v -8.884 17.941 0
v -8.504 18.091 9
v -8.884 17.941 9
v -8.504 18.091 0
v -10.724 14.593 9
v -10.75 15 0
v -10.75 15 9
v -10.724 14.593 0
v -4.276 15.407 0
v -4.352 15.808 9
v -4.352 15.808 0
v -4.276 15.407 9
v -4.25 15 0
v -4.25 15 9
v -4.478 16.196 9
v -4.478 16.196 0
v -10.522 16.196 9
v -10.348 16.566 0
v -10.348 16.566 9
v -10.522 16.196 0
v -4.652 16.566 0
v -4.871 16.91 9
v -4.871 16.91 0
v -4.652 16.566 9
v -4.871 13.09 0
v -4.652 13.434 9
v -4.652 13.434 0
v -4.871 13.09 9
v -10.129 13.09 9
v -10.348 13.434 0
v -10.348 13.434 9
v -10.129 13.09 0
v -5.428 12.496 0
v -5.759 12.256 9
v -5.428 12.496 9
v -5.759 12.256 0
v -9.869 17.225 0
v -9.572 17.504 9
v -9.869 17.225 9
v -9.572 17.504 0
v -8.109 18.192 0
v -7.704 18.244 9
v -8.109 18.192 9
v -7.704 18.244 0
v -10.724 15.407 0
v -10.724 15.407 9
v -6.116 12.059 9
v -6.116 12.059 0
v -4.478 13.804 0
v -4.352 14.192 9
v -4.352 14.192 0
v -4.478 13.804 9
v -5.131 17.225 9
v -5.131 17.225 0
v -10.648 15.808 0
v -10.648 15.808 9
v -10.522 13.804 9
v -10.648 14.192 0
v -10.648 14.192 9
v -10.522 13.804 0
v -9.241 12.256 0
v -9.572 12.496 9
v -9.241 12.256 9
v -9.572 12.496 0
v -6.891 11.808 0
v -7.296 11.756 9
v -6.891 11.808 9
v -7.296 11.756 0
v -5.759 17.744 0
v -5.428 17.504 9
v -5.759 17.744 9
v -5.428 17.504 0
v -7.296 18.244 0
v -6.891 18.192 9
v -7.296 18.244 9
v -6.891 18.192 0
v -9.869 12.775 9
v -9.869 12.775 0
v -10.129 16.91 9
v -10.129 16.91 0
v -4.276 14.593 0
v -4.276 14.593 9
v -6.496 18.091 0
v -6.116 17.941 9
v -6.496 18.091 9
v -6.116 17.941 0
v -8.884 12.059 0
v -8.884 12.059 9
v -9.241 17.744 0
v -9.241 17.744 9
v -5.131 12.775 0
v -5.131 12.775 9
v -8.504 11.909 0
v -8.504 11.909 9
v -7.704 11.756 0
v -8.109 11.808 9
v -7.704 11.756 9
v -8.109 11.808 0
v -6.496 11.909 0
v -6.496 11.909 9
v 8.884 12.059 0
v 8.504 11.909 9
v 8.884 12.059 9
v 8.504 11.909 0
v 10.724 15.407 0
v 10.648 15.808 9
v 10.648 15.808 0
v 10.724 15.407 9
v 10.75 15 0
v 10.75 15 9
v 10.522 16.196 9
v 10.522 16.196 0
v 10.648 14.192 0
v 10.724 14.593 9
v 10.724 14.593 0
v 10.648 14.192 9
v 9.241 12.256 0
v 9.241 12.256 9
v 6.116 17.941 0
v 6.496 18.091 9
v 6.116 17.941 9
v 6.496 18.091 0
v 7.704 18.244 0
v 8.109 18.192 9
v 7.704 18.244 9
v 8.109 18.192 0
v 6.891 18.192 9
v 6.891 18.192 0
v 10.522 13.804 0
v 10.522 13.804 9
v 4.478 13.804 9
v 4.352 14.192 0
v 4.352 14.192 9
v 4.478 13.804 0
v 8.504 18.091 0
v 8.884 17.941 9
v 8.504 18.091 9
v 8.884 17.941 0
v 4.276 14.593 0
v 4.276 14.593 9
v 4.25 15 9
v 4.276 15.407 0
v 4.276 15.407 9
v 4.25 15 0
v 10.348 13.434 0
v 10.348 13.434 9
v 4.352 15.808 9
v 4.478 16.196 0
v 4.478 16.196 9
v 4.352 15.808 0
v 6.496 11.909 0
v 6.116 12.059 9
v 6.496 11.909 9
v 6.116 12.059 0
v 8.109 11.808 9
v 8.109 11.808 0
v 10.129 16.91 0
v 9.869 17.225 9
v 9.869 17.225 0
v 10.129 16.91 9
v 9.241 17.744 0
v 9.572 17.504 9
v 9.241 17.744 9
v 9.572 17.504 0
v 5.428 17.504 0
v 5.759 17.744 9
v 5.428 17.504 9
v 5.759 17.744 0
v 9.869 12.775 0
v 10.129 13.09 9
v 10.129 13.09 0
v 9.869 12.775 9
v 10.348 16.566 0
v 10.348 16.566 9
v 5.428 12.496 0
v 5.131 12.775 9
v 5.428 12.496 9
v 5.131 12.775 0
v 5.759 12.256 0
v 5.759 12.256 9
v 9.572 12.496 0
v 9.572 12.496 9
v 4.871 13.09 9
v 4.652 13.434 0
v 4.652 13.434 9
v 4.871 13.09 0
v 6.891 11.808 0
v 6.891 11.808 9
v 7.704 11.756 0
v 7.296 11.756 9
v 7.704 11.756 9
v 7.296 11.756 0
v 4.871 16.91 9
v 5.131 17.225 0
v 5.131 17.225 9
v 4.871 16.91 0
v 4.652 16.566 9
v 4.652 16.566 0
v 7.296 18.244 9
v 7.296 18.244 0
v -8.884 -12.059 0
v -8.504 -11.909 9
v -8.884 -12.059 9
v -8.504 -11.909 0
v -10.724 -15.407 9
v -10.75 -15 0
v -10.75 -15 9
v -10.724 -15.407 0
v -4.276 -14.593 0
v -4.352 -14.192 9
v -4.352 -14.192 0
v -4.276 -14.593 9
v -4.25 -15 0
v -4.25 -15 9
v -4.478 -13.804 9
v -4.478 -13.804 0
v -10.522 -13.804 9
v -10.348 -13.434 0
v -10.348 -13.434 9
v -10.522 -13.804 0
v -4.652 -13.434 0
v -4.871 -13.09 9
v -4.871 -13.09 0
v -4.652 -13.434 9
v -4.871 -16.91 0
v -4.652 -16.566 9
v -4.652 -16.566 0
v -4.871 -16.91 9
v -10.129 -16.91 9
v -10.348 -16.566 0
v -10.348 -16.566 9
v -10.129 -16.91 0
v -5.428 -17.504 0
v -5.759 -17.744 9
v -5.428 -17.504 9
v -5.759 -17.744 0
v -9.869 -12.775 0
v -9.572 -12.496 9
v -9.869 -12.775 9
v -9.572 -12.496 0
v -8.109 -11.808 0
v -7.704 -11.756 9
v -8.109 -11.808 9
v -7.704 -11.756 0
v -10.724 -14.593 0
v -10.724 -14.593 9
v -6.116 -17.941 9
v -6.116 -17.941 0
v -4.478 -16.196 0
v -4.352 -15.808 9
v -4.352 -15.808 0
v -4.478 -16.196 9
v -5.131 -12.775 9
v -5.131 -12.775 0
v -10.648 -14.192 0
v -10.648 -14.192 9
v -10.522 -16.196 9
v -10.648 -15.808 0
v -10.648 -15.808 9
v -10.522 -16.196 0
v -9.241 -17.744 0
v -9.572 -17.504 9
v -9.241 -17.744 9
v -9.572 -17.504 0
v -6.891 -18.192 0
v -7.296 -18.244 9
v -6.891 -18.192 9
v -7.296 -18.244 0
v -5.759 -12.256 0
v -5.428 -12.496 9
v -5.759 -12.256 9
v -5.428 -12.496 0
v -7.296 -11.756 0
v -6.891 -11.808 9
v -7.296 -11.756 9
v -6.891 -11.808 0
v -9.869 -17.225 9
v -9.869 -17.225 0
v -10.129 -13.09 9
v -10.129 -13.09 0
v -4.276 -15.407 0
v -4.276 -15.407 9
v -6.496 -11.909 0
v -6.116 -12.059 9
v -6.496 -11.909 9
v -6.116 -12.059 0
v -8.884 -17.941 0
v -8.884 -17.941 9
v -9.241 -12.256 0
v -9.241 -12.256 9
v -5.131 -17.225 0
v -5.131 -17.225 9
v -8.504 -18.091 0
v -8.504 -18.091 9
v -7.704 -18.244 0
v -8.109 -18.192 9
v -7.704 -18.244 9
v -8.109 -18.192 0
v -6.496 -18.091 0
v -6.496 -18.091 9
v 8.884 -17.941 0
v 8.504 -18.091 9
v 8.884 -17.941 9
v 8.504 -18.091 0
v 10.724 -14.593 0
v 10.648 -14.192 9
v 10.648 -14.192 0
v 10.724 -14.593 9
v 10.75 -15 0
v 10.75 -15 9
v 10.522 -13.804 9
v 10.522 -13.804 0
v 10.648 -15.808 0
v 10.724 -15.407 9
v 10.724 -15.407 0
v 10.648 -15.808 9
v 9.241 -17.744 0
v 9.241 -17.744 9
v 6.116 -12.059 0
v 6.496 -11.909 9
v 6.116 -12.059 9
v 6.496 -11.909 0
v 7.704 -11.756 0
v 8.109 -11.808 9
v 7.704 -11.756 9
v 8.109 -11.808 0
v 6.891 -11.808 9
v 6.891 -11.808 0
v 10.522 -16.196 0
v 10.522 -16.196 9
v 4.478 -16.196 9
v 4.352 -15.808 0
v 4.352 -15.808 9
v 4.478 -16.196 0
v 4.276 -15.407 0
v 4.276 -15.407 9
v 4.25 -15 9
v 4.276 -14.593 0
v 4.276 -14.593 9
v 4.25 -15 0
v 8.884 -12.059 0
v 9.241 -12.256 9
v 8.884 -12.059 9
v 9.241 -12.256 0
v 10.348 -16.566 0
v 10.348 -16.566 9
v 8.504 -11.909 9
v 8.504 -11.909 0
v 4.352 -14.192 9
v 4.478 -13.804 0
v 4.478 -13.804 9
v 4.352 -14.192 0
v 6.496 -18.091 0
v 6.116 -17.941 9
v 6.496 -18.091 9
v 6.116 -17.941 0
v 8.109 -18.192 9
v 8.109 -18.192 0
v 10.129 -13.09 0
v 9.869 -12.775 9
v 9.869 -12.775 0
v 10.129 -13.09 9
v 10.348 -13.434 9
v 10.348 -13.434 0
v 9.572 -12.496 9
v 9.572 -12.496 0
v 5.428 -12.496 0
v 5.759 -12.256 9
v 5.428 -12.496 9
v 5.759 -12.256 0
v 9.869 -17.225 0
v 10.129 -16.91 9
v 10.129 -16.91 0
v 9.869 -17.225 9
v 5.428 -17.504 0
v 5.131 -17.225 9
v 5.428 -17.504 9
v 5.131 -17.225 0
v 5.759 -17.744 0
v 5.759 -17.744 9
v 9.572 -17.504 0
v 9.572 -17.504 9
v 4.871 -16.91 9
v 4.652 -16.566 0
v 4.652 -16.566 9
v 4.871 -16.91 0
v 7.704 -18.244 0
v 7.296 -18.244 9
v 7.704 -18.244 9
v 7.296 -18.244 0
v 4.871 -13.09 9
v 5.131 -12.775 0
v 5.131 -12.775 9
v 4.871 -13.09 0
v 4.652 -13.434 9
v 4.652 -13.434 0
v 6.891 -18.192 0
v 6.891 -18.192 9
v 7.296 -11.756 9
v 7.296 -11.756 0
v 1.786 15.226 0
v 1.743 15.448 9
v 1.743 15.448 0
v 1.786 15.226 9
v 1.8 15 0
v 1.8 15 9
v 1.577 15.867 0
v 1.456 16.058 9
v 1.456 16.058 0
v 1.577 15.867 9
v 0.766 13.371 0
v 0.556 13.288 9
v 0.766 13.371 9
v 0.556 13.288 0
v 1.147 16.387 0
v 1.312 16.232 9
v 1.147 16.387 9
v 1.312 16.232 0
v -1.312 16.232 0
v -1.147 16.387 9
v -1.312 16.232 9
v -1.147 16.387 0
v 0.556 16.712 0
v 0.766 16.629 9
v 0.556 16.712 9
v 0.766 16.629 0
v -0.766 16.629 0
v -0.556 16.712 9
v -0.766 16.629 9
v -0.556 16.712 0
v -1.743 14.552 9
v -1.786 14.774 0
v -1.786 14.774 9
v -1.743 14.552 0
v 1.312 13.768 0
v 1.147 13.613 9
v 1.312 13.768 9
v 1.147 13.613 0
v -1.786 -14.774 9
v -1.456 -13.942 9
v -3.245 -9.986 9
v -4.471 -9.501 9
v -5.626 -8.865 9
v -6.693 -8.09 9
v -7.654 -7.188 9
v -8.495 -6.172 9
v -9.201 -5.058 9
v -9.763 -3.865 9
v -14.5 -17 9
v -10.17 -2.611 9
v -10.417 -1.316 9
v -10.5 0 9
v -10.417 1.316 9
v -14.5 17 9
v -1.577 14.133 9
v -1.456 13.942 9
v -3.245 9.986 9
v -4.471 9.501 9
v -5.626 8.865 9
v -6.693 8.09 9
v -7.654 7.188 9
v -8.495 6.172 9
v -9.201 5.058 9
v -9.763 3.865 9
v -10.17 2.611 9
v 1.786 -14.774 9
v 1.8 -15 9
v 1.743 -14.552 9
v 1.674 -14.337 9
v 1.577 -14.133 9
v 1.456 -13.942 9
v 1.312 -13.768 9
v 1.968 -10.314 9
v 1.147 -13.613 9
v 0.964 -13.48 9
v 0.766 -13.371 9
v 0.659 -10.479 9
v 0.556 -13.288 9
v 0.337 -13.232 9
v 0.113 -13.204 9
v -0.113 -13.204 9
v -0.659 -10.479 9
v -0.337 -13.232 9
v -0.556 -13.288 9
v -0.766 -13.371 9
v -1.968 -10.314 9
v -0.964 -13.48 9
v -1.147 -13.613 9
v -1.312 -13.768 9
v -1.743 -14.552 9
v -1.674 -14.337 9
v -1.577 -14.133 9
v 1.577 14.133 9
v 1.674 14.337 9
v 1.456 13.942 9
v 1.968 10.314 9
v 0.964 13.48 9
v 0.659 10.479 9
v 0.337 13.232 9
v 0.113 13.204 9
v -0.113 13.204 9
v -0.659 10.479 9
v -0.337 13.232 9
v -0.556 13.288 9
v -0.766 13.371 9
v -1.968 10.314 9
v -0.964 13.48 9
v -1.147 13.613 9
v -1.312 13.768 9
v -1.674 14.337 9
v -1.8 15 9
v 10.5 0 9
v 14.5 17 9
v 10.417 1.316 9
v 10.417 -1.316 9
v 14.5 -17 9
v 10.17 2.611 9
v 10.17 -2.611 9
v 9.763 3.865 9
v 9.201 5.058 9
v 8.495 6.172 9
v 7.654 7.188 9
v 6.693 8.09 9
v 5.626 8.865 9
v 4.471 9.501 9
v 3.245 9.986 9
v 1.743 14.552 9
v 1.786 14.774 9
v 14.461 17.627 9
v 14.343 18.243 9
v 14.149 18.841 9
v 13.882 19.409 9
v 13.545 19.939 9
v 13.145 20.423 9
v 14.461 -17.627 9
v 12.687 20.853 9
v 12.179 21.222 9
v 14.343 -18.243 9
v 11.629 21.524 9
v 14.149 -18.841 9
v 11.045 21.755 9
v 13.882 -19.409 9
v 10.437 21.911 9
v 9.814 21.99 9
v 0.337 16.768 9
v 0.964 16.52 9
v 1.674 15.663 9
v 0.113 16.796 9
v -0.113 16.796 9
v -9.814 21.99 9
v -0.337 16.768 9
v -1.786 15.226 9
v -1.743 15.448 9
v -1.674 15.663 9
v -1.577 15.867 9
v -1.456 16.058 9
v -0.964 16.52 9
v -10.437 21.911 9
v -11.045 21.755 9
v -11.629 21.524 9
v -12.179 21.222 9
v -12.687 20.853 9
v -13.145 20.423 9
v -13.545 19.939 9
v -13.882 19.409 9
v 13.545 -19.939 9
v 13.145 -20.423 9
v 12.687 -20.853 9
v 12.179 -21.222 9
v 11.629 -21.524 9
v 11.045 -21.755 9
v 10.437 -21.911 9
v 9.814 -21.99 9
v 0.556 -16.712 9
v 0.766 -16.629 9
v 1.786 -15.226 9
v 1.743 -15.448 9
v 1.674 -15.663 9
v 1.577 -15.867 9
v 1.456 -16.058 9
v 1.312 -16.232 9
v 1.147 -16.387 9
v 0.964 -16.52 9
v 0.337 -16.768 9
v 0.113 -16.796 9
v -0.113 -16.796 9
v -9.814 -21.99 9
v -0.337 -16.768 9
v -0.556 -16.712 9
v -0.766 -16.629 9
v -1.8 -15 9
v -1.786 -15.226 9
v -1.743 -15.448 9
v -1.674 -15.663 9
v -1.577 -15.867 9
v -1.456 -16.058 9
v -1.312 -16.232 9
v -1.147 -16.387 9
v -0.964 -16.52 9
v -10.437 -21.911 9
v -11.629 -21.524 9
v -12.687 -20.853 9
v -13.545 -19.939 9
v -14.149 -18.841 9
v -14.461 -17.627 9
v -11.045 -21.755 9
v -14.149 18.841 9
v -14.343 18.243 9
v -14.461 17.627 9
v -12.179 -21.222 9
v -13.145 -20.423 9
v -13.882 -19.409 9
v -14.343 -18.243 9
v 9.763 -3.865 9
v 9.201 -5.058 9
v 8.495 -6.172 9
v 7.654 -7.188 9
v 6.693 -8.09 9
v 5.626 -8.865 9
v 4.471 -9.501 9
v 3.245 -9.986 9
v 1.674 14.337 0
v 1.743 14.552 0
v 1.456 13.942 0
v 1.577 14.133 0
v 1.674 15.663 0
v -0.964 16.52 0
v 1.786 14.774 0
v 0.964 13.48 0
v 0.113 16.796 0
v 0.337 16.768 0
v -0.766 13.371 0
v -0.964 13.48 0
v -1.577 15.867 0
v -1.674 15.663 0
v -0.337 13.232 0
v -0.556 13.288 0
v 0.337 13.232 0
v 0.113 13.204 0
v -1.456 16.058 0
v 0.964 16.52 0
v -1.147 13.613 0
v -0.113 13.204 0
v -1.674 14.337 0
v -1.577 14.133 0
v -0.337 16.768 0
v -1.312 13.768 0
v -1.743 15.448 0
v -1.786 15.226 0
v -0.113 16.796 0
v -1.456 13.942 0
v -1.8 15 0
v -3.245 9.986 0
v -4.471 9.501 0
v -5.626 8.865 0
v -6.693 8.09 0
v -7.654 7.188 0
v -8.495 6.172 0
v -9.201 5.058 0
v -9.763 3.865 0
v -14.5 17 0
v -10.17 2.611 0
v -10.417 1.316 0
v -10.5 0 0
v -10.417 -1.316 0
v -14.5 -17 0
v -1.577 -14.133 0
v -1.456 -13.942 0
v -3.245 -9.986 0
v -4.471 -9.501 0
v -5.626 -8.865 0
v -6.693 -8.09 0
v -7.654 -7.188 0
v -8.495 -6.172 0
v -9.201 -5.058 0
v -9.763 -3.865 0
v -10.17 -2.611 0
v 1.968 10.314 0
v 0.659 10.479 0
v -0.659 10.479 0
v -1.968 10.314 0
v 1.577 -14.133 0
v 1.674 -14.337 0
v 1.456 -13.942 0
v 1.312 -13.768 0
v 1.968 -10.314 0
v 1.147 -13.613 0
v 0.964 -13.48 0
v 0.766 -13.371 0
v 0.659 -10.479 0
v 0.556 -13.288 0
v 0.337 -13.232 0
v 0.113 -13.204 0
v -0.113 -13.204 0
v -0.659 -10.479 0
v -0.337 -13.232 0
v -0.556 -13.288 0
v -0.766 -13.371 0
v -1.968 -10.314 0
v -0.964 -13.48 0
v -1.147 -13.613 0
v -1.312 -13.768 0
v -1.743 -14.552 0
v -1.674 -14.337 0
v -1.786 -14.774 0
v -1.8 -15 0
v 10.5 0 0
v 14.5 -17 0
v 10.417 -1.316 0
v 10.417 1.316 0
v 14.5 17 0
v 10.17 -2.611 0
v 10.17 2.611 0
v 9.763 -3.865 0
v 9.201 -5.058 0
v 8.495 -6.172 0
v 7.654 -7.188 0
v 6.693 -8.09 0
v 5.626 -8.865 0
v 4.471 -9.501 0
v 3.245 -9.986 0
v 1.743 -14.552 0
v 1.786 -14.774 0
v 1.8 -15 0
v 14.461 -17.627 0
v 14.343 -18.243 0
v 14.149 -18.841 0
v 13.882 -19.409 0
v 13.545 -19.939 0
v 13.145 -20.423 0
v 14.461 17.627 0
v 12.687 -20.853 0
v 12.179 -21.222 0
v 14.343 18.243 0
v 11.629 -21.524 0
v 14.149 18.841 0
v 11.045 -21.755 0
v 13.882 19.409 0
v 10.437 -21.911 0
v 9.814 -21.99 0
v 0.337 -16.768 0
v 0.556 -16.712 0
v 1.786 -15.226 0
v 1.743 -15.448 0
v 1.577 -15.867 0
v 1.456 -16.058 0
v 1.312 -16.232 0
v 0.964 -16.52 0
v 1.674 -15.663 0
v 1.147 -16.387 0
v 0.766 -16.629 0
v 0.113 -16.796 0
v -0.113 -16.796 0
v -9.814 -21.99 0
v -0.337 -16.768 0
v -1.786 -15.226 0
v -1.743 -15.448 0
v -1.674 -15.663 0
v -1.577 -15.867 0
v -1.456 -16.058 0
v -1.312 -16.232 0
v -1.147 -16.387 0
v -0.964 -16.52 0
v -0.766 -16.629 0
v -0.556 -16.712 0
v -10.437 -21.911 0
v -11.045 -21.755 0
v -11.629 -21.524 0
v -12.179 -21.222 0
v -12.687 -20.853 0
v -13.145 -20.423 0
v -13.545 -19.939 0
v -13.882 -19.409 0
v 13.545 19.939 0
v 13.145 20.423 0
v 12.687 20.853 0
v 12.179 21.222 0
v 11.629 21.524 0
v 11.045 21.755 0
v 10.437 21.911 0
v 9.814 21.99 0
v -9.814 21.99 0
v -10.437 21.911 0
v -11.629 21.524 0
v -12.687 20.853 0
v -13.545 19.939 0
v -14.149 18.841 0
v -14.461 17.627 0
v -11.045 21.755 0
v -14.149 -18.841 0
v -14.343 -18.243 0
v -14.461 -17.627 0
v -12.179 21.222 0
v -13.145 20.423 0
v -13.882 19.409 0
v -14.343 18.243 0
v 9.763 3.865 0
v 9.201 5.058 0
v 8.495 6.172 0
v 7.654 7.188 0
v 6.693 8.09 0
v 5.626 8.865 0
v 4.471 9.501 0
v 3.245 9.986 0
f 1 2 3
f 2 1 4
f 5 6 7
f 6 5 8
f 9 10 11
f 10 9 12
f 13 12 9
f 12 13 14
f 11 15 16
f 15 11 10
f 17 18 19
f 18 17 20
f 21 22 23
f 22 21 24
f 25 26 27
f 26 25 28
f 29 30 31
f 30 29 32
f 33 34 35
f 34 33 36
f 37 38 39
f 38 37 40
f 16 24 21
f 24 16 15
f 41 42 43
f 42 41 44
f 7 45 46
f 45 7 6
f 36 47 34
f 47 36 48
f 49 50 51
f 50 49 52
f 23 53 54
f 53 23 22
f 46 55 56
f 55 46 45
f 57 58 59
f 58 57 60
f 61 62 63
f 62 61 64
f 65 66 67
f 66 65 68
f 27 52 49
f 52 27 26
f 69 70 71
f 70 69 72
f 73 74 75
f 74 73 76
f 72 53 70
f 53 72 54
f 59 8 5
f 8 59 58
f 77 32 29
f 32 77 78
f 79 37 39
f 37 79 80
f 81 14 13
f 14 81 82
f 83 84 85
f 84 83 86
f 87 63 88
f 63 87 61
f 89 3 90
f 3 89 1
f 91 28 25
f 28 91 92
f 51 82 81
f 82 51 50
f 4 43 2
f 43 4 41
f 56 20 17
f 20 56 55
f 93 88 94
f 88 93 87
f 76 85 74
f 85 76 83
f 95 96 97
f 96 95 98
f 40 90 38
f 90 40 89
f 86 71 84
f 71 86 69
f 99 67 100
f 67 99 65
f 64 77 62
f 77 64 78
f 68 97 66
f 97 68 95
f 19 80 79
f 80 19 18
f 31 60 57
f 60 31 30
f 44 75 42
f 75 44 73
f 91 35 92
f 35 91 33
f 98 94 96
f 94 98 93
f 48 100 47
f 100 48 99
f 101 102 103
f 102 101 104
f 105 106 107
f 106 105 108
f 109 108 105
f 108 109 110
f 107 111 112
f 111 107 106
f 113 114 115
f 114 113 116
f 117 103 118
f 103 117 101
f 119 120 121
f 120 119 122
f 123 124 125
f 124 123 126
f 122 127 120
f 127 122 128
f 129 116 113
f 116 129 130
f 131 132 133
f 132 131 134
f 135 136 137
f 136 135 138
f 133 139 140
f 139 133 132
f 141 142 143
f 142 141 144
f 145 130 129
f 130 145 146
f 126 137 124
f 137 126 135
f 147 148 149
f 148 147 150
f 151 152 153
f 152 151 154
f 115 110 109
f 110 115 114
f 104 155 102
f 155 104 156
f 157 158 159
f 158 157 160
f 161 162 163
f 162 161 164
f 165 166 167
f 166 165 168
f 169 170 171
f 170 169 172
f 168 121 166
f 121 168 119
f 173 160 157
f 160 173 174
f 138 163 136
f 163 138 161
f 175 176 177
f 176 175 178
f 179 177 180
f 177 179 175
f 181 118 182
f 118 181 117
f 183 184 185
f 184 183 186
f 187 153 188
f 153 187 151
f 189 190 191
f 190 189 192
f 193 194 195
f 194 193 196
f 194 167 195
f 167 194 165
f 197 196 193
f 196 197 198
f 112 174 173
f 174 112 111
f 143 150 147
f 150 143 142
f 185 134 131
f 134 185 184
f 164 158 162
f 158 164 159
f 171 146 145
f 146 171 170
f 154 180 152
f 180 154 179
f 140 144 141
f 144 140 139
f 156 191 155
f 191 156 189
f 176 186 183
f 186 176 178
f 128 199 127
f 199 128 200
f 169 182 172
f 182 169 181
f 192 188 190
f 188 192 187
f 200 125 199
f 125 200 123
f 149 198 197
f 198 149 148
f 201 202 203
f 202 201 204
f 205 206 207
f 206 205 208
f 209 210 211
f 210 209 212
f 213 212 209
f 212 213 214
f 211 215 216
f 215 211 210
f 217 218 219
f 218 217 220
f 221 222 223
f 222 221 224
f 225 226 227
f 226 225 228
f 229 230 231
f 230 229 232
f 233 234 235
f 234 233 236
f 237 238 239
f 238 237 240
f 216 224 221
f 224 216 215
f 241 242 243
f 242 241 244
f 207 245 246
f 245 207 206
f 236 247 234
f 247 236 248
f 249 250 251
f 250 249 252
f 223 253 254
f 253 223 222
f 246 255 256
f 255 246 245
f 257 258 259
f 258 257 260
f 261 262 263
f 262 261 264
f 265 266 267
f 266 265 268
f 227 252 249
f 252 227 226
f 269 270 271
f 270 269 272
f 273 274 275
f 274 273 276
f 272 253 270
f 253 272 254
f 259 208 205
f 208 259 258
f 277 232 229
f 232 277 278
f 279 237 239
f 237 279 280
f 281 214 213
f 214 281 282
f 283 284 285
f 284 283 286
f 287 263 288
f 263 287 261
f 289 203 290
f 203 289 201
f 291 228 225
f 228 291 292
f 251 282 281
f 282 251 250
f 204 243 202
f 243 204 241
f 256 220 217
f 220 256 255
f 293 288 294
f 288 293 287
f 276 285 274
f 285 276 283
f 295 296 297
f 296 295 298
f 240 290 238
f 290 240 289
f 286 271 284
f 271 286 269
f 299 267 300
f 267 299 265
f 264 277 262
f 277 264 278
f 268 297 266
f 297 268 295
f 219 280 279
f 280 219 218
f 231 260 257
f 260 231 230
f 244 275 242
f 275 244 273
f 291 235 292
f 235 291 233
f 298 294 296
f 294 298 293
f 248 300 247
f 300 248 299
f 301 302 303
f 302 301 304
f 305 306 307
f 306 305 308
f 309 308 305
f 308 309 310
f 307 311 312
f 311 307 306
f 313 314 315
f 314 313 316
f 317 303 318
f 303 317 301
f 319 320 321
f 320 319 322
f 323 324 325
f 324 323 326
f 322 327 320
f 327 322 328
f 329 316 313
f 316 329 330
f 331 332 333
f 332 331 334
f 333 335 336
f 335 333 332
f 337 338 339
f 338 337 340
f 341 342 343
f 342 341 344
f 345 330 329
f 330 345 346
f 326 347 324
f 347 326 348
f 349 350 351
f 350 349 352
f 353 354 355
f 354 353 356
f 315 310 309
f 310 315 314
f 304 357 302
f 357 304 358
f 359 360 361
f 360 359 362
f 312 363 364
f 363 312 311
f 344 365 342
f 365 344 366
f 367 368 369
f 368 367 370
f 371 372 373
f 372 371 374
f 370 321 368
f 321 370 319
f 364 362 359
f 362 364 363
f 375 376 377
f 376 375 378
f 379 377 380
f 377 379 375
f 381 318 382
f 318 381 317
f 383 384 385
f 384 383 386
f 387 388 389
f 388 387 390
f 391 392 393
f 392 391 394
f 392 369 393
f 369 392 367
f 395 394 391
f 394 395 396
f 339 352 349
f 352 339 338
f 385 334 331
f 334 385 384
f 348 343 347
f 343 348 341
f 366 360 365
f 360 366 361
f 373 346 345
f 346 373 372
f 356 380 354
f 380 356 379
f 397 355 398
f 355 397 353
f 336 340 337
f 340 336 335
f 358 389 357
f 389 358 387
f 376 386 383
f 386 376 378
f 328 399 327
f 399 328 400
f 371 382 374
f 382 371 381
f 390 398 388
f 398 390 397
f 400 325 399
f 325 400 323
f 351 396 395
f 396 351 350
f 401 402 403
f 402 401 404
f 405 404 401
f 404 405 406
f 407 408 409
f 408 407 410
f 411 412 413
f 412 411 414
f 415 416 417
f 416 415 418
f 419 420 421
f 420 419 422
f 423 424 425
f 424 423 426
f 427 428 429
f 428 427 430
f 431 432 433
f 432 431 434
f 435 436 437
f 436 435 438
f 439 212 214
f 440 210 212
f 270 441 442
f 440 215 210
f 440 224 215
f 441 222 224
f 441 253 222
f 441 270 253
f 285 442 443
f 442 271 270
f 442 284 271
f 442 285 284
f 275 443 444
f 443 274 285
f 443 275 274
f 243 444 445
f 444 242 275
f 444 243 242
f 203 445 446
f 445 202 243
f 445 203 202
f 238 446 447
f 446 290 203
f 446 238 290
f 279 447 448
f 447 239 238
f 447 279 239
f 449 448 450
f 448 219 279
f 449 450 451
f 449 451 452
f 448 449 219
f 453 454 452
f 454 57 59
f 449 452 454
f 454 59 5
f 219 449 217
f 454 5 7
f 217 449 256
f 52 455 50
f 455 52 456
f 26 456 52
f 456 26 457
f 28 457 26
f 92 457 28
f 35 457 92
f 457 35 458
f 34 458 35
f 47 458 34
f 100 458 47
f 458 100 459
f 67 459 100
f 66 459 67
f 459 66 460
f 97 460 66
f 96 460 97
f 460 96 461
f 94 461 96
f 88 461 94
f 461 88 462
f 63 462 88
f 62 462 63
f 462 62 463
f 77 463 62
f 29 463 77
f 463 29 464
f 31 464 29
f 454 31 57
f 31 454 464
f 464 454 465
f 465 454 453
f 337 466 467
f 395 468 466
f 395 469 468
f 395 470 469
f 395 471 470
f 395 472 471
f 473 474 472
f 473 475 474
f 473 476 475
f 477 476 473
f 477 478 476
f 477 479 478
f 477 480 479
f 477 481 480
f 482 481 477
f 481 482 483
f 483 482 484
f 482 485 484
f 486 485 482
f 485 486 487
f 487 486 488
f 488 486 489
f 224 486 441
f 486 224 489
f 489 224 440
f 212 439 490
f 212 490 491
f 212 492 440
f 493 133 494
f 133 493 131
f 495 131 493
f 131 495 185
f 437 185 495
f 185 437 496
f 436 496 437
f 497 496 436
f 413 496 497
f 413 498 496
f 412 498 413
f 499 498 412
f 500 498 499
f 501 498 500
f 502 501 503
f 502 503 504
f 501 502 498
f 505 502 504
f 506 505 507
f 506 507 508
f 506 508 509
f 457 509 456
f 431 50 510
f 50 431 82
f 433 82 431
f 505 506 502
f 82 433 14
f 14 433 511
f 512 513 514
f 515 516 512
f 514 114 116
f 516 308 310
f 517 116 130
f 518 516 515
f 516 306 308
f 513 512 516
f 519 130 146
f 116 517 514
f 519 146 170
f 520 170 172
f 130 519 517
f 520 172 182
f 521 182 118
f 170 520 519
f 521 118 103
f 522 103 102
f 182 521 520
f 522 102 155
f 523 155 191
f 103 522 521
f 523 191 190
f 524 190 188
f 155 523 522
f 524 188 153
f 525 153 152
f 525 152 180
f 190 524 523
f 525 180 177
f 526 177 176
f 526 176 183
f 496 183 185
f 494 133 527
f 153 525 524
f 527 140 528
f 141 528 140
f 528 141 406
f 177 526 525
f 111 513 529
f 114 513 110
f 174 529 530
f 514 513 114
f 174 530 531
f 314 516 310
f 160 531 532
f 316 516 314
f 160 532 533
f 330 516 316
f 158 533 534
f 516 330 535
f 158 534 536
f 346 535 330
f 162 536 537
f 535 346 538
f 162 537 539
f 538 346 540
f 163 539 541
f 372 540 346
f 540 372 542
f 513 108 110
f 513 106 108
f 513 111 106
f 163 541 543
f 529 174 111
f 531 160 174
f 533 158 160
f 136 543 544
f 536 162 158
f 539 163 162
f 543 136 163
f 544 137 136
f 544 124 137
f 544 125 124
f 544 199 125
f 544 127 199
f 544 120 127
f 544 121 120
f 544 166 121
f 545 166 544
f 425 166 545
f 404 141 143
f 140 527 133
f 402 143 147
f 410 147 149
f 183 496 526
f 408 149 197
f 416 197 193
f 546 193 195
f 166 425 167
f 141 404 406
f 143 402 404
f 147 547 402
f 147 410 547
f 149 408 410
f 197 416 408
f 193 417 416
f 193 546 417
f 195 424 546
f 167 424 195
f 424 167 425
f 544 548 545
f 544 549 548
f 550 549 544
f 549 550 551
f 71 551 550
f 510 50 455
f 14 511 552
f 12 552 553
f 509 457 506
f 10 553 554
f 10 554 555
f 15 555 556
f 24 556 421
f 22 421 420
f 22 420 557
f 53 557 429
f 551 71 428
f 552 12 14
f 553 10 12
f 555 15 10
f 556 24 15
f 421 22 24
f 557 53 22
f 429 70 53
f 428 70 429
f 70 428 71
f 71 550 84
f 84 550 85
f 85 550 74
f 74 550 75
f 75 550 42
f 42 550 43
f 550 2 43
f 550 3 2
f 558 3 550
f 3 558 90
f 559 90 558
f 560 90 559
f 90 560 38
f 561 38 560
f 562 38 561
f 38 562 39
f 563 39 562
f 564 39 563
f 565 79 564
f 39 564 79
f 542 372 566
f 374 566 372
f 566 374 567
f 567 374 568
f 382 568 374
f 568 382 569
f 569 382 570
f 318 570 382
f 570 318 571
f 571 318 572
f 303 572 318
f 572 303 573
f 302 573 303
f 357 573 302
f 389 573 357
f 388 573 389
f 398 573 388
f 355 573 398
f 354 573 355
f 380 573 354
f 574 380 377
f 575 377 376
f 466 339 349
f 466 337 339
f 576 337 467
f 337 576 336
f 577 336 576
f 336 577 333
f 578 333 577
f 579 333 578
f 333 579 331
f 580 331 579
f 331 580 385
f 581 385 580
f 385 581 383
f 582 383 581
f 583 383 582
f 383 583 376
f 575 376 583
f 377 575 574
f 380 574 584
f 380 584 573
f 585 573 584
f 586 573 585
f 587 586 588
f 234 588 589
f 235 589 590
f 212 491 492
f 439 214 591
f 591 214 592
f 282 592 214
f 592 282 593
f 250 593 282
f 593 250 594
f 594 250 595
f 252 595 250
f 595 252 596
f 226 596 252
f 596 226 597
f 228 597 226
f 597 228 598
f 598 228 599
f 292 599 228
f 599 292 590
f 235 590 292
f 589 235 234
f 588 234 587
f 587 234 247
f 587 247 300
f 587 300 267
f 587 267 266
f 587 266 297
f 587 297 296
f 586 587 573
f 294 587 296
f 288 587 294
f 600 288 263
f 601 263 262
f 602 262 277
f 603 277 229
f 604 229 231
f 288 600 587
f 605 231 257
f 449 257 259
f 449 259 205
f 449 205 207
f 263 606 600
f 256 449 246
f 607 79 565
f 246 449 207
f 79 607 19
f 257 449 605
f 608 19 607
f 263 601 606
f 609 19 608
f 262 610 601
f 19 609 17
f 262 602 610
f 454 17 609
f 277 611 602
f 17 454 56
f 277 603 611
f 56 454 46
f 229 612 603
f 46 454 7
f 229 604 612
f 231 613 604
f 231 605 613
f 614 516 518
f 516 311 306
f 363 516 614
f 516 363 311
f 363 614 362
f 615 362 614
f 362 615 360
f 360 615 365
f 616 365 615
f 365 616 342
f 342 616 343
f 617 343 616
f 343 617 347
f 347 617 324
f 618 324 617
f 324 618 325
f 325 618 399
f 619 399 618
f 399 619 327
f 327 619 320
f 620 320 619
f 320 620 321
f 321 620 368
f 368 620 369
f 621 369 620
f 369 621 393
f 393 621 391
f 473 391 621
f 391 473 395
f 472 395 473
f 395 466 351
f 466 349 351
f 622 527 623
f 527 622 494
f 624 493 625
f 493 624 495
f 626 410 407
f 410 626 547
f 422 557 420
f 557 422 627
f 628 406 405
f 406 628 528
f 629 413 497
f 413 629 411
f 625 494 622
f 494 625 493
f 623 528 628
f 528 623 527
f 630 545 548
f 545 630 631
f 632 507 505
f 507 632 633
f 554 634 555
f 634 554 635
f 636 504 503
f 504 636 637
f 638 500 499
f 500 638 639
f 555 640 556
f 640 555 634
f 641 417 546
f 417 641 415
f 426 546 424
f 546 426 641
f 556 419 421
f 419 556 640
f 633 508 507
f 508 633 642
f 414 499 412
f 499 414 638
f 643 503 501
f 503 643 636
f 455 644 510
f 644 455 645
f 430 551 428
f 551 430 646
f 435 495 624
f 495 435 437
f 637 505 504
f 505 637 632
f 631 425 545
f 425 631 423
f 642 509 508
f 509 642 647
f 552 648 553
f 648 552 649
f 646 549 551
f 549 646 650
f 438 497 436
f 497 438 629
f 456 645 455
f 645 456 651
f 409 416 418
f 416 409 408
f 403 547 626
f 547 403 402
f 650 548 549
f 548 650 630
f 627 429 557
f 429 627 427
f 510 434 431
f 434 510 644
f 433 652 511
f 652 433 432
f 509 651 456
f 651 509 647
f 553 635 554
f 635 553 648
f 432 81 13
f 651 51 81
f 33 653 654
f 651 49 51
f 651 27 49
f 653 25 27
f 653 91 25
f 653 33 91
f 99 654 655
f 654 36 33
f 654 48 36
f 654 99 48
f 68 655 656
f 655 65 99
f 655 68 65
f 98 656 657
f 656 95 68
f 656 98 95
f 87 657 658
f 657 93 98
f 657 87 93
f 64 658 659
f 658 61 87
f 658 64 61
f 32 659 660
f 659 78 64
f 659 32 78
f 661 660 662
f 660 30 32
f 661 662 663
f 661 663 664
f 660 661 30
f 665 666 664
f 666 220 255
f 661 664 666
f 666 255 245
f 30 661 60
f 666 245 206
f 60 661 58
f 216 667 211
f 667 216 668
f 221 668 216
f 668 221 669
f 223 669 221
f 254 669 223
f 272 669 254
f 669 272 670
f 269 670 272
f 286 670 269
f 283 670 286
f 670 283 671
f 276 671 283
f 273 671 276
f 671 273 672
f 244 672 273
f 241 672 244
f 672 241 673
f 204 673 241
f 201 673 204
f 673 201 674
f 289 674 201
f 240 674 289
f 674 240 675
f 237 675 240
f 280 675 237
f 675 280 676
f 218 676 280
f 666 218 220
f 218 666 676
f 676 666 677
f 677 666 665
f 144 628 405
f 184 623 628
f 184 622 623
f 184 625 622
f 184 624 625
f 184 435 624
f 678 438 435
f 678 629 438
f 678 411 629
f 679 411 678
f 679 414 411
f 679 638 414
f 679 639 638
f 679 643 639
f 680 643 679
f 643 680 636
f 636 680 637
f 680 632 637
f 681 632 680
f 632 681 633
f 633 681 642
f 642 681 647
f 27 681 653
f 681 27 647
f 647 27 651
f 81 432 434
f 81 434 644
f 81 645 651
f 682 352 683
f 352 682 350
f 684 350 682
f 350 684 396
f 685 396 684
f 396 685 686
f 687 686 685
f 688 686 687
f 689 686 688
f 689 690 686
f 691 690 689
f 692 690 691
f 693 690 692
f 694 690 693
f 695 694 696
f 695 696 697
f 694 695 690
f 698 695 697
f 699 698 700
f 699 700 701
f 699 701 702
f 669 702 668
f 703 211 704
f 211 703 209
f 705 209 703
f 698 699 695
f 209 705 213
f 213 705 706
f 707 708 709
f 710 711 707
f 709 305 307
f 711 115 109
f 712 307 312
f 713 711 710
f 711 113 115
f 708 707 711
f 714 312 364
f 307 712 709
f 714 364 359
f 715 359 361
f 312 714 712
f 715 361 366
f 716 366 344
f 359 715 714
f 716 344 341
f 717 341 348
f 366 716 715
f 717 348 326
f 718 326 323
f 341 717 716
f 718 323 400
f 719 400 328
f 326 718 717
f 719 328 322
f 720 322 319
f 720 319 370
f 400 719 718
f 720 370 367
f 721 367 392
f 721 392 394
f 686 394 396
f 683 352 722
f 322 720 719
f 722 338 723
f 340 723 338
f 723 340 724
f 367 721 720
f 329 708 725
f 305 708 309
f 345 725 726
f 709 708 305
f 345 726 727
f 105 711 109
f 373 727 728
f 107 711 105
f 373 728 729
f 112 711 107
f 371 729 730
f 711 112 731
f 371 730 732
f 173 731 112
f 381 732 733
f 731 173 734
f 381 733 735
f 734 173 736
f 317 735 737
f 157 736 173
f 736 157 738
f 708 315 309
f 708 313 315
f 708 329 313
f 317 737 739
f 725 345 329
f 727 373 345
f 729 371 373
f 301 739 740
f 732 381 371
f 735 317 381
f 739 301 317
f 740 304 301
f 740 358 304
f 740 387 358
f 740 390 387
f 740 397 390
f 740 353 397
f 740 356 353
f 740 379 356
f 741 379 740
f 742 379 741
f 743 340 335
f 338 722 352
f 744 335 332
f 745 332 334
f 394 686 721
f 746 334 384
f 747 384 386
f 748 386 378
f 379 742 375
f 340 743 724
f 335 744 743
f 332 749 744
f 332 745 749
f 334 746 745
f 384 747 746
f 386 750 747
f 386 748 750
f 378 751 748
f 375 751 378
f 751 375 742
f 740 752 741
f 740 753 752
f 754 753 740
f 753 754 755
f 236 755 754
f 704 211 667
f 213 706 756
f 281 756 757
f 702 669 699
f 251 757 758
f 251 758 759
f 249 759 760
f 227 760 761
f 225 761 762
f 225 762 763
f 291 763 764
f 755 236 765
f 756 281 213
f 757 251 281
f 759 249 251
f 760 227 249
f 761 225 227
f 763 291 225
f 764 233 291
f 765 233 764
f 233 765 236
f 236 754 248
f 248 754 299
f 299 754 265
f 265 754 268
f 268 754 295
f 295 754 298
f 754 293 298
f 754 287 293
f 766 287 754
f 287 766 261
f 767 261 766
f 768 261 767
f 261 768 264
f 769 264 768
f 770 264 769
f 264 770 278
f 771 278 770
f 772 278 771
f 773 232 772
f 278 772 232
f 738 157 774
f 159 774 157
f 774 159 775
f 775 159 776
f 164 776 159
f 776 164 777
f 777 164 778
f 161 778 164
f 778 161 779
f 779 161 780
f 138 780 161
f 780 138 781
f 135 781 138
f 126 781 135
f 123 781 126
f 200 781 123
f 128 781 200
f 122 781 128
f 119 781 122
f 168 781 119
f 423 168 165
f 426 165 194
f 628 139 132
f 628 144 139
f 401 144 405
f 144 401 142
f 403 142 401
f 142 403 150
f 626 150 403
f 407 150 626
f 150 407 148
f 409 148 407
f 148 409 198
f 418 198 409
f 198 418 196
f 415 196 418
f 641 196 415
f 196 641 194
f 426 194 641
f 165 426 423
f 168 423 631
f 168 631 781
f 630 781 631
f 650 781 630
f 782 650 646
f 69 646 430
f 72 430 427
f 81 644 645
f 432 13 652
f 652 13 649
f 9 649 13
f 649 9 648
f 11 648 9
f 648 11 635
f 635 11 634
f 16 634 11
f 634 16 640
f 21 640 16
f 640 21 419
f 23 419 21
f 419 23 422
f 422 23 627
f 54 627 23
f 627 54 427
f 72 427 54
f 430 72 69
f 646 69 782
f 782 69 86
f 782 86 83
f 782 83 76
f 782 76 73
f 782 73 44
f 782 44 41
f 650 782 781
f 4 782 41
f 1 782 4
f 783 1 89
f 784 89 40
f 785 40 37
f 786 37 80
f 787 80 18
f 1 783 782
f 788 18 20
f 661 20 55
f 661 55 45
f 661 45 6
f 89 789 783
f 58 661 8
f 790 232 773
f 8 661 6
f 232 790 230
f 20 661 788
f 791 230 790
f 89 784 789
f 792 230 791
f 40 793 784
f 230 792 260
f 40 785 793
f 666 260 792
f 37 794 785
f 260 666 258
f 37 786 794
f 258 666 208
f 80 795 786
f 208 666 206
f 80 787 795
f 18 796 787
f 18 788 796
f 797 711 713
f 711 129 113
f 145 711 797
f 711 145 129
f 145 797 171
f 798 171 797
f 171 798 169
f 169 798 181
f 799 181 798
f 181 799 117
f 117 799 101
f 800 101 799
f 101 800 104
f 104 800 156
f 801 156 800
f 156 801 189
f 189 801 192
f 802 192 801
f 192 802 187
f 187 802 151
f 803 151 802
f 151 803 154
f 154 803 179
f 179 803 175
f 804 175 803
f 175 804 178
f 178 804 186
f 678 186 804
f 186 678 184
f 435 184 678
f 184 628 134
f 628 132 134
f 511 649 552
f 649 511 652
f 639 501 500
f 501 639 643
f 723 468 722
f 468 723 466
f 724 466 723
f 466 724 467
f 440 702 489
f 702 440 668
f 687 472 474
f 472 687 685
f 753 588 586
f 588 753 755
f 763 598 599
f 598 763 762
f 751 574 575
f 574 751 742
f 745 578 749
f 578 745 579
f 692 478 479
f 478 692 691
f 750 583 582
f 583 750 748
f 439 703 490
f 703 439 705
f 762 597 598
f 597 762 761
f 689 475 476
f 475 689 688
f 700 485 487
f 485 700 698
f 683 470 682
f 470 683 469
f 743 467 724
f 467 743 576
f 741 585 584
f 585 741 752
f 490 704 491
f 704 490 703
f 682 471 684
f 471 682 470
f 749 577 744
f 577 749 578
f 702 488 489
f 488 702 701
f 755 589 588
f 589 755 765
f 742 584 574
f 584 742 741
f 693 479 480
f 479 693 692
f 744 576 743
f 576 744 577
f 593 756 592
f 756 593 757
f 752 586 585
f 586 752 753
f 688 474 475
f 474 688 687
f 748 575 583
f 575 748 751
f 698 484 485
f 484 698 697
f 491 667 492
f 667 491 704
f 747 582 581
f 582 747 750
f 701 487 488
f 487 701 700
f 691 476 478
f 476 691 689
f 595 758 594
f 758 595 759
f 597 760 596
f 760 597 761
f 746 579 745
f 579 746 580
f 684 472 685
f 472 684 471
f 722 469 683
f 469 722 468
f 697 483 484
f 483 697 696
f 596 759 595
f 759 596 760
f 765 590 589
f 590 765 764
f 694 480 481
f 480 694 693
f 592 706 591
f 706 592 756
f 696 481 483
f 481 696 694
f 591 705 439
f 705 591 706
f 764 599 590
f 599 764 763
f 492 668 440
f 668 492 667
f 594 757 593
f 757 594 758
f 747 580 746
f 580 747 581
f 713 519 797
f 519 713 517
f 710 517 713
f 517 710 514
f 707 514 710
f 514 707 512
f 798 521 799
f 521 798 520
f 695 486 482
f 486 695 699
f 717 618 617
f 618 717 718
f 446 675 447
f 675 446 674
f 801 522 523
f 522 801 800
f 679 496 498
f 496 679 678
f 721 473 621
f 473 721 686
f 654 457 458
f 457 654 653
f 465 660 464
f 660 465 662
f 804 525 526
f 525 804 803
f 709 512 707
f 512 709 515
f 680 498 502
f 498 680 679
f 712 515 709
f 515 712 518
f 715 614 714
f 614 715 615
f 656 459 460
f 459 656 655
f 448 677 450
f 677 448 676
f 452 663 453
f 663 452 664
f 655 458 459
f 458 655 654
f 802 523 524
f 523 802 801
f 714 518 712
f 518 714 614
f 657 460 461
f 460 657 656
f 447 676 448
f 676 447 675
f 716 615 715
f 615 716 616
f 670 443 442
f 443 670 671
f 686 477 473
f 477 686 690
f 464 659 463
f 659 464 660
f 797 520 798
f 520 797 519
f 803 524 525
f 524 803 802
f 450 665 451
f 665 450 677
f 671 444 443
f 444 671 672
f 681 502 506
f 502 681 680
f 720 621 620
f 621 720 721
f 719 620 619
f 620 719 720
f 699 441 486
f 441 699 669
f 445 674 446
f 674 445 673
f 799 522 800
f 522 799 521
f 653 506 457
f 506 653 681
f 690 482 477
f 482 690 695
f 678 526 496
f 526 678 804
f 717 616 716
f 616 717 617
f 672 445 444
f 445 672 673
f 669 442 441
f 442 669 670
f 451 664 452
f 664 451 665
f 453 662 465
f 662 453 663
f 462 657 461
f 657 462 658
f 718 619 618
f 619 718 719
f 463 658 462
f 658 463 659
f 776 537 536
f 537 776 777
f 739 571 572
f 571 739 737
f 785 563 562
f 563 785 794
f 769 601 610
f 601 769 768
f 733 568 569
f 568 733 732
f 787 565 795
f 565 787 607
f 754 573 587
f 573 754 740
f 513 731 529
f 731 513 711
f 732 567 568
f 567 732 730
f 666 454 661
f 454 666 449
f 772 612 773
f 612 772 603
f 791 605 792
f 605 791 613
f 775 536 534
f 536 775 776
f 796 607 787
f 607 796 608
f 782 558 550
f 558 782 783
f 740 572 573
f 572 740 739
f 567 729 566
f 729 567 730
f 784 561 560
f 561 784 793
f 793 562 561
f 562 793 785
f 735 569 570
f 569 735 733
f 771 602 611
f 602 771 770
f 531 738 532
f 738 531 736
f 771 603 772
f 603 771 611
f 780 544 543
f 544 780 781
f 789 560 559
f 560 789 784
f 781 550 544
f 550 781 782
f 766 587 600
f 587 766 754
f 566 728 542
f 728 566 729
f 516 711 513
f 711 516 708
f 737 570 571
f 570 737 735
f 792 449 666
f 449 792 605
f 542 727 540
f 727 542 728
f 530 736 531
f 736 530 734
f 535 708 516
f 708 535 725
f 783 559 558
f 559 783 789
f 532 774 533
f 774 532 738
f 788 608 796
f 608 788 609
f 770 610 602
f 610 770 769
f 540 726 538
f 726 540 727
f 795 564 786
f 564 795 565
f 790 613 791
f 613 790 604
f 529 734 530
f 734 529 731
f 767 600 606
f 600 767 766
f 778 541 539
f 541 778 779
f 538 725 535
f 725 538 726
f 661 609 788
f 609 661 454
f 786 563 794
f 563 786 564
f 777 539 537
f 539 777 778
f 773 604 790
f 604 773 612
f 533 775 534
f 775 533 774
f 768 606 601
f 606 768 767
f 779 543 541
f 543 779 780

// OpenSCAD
$fn = 50;


difference() {
	union() {
		hull() {
			translate(v = [-9.5000000000, 17.0000000000, 0]) {
				cylinder(h = 9, r = 5);
			}
			translate(v = [9.5000000000, 17.0000000000, 0]) {
				cylinder(h = 9, r = 5);
			}
			translate(v = [-9.5000000000, -17.0000000000, 0]) {
				cylinder(h = 9, r = 5);
			}
			translate(v = [9.5000000000, -17.0000000000, 0]) {
				cylinder(h = 9, r = 5);
			}
		}
	}
	union() {
		#translate(v = [-7.5000000000, 15.0000000000, 0]) {
			cylinder(h = 9, r = 3.2500000000);
		}
		#translate(v = [7.5000000000, 15.0000000000, 0]) {
			cylinder(h = 9, r = 3.2500000000);
		}
		#translate(v = [-7.5000000000, -15.0000000000, 0]) {
			cylinder(h = 9, r = 3.2500000000);
		}
		#translate(v = [7.5000000000, -15.0000000000, 0]) {
			cylinder(h = 9, r = 3.2500000000);
		}
		#translate(v = [-7.5000000000, -15.0000000000, -100.0000000000]) {
			cylinder(h = 200, r = 3.2500000000);
		}
		#translate(v = [-7.5000000000, 15.0000000000, -100.0000000000]) {
			cylinder(h = 200, r = 3.2500000000);
		}
		#translate(v = [7.5000000000, -15.0000000000, -100.0000000000]) {
			cylinder(h = 200, r = 3.2500000000);
		}
		#translate(v = [7.5000000000, 15.0000000000, -100.0000000000]) {
			cylinder(h = 200, r = 3.2500000000);
		}
		#translate(v = [-7.5000000000, 15.0000000000, 0]) {
			cylinder(h = 9, r = 1.8000000000);
		}
		#translate(v = [0.0000000000, 15.0000000000, 0]) {
			cylinder(h = 9, r = 1.8000000000);
		}
		#translate(v = [7.5000000000, 15.0000000000, 0]) {
			cylinder(h = 9, r = 1.8000000000);
		}
		#translate(v = [-7.5000000000, -15.0000000000, 0]) {
			cylinder(h = 9, r = 1.8000000000);
		}
		#translate(v = [0.0000000000, -15.0000000000, 0]) {
			cylinder(h = 9, r = 1.8000000000);
		}
		#translate(v = [7.5000000000, -15.0000000000, 0]) {
			cylinder(h = 9, r = 1.8000000000);
		}
		#translate(v = [-7.5000000000, 15.0000000000, 0]) {
			cylinder(h = 9, r = 1.8000000000);
		}
		#translate(v = [0.0000000000, 15.0000000000, 0]) {
			cylinder(h = 9, r = 1.8000000000);
		}
		#translate(v = [7.5000000000, 15.0000000000, 0]) {
			cylinder(h = 9, r = 1.8000000000);
		}
		#translate(v = [-7.5000000000, -15.0000000000, 0]) {
			cylinder(h = 9, r = 1.8000000000);
		}
		#translate(v = [0.0000000000, -15.0000000000, 0]) {
			cylinder(h = 9, r = 1.8000000000);
		}
		#translate(v = [7.5000000000, -15.0000000000, 0]) {
			cylinder(h = 9, r = 1.8000000000);
		}
		#translate(v = [-7.5000000000, 15.0000000000, 0]) {
			cylinder(h = 9, r = 1.8000000000);
		}
		#translate(v = [0.0000000000, 15.0000000000, 0]) {
			cylinder(h = 9, r = 1.8000000000);
		}
		#translate(v = [7.5000000000, 15.0000000000, 0]) {
			cylinder(h = 9, r = 1.8000000000);
		}
		#translate(v = [-7.5000000000, -15.0000000000, 0]) {
			cylinder(h = 9, r = 1.8000000000);
		}
		#translate(v = [0.0000000000, -15.0000000000, 0]) {
			cylinder(h = 9, r = 1.8000000000);
		}
		#translate(v = [7.5000000000, -15.0000000000, 0]) {
			cylinder(h = 9, r = 1.8000000000);
		}
		#cylinder(h = 9, r = 10.5000000000);
	}
}
